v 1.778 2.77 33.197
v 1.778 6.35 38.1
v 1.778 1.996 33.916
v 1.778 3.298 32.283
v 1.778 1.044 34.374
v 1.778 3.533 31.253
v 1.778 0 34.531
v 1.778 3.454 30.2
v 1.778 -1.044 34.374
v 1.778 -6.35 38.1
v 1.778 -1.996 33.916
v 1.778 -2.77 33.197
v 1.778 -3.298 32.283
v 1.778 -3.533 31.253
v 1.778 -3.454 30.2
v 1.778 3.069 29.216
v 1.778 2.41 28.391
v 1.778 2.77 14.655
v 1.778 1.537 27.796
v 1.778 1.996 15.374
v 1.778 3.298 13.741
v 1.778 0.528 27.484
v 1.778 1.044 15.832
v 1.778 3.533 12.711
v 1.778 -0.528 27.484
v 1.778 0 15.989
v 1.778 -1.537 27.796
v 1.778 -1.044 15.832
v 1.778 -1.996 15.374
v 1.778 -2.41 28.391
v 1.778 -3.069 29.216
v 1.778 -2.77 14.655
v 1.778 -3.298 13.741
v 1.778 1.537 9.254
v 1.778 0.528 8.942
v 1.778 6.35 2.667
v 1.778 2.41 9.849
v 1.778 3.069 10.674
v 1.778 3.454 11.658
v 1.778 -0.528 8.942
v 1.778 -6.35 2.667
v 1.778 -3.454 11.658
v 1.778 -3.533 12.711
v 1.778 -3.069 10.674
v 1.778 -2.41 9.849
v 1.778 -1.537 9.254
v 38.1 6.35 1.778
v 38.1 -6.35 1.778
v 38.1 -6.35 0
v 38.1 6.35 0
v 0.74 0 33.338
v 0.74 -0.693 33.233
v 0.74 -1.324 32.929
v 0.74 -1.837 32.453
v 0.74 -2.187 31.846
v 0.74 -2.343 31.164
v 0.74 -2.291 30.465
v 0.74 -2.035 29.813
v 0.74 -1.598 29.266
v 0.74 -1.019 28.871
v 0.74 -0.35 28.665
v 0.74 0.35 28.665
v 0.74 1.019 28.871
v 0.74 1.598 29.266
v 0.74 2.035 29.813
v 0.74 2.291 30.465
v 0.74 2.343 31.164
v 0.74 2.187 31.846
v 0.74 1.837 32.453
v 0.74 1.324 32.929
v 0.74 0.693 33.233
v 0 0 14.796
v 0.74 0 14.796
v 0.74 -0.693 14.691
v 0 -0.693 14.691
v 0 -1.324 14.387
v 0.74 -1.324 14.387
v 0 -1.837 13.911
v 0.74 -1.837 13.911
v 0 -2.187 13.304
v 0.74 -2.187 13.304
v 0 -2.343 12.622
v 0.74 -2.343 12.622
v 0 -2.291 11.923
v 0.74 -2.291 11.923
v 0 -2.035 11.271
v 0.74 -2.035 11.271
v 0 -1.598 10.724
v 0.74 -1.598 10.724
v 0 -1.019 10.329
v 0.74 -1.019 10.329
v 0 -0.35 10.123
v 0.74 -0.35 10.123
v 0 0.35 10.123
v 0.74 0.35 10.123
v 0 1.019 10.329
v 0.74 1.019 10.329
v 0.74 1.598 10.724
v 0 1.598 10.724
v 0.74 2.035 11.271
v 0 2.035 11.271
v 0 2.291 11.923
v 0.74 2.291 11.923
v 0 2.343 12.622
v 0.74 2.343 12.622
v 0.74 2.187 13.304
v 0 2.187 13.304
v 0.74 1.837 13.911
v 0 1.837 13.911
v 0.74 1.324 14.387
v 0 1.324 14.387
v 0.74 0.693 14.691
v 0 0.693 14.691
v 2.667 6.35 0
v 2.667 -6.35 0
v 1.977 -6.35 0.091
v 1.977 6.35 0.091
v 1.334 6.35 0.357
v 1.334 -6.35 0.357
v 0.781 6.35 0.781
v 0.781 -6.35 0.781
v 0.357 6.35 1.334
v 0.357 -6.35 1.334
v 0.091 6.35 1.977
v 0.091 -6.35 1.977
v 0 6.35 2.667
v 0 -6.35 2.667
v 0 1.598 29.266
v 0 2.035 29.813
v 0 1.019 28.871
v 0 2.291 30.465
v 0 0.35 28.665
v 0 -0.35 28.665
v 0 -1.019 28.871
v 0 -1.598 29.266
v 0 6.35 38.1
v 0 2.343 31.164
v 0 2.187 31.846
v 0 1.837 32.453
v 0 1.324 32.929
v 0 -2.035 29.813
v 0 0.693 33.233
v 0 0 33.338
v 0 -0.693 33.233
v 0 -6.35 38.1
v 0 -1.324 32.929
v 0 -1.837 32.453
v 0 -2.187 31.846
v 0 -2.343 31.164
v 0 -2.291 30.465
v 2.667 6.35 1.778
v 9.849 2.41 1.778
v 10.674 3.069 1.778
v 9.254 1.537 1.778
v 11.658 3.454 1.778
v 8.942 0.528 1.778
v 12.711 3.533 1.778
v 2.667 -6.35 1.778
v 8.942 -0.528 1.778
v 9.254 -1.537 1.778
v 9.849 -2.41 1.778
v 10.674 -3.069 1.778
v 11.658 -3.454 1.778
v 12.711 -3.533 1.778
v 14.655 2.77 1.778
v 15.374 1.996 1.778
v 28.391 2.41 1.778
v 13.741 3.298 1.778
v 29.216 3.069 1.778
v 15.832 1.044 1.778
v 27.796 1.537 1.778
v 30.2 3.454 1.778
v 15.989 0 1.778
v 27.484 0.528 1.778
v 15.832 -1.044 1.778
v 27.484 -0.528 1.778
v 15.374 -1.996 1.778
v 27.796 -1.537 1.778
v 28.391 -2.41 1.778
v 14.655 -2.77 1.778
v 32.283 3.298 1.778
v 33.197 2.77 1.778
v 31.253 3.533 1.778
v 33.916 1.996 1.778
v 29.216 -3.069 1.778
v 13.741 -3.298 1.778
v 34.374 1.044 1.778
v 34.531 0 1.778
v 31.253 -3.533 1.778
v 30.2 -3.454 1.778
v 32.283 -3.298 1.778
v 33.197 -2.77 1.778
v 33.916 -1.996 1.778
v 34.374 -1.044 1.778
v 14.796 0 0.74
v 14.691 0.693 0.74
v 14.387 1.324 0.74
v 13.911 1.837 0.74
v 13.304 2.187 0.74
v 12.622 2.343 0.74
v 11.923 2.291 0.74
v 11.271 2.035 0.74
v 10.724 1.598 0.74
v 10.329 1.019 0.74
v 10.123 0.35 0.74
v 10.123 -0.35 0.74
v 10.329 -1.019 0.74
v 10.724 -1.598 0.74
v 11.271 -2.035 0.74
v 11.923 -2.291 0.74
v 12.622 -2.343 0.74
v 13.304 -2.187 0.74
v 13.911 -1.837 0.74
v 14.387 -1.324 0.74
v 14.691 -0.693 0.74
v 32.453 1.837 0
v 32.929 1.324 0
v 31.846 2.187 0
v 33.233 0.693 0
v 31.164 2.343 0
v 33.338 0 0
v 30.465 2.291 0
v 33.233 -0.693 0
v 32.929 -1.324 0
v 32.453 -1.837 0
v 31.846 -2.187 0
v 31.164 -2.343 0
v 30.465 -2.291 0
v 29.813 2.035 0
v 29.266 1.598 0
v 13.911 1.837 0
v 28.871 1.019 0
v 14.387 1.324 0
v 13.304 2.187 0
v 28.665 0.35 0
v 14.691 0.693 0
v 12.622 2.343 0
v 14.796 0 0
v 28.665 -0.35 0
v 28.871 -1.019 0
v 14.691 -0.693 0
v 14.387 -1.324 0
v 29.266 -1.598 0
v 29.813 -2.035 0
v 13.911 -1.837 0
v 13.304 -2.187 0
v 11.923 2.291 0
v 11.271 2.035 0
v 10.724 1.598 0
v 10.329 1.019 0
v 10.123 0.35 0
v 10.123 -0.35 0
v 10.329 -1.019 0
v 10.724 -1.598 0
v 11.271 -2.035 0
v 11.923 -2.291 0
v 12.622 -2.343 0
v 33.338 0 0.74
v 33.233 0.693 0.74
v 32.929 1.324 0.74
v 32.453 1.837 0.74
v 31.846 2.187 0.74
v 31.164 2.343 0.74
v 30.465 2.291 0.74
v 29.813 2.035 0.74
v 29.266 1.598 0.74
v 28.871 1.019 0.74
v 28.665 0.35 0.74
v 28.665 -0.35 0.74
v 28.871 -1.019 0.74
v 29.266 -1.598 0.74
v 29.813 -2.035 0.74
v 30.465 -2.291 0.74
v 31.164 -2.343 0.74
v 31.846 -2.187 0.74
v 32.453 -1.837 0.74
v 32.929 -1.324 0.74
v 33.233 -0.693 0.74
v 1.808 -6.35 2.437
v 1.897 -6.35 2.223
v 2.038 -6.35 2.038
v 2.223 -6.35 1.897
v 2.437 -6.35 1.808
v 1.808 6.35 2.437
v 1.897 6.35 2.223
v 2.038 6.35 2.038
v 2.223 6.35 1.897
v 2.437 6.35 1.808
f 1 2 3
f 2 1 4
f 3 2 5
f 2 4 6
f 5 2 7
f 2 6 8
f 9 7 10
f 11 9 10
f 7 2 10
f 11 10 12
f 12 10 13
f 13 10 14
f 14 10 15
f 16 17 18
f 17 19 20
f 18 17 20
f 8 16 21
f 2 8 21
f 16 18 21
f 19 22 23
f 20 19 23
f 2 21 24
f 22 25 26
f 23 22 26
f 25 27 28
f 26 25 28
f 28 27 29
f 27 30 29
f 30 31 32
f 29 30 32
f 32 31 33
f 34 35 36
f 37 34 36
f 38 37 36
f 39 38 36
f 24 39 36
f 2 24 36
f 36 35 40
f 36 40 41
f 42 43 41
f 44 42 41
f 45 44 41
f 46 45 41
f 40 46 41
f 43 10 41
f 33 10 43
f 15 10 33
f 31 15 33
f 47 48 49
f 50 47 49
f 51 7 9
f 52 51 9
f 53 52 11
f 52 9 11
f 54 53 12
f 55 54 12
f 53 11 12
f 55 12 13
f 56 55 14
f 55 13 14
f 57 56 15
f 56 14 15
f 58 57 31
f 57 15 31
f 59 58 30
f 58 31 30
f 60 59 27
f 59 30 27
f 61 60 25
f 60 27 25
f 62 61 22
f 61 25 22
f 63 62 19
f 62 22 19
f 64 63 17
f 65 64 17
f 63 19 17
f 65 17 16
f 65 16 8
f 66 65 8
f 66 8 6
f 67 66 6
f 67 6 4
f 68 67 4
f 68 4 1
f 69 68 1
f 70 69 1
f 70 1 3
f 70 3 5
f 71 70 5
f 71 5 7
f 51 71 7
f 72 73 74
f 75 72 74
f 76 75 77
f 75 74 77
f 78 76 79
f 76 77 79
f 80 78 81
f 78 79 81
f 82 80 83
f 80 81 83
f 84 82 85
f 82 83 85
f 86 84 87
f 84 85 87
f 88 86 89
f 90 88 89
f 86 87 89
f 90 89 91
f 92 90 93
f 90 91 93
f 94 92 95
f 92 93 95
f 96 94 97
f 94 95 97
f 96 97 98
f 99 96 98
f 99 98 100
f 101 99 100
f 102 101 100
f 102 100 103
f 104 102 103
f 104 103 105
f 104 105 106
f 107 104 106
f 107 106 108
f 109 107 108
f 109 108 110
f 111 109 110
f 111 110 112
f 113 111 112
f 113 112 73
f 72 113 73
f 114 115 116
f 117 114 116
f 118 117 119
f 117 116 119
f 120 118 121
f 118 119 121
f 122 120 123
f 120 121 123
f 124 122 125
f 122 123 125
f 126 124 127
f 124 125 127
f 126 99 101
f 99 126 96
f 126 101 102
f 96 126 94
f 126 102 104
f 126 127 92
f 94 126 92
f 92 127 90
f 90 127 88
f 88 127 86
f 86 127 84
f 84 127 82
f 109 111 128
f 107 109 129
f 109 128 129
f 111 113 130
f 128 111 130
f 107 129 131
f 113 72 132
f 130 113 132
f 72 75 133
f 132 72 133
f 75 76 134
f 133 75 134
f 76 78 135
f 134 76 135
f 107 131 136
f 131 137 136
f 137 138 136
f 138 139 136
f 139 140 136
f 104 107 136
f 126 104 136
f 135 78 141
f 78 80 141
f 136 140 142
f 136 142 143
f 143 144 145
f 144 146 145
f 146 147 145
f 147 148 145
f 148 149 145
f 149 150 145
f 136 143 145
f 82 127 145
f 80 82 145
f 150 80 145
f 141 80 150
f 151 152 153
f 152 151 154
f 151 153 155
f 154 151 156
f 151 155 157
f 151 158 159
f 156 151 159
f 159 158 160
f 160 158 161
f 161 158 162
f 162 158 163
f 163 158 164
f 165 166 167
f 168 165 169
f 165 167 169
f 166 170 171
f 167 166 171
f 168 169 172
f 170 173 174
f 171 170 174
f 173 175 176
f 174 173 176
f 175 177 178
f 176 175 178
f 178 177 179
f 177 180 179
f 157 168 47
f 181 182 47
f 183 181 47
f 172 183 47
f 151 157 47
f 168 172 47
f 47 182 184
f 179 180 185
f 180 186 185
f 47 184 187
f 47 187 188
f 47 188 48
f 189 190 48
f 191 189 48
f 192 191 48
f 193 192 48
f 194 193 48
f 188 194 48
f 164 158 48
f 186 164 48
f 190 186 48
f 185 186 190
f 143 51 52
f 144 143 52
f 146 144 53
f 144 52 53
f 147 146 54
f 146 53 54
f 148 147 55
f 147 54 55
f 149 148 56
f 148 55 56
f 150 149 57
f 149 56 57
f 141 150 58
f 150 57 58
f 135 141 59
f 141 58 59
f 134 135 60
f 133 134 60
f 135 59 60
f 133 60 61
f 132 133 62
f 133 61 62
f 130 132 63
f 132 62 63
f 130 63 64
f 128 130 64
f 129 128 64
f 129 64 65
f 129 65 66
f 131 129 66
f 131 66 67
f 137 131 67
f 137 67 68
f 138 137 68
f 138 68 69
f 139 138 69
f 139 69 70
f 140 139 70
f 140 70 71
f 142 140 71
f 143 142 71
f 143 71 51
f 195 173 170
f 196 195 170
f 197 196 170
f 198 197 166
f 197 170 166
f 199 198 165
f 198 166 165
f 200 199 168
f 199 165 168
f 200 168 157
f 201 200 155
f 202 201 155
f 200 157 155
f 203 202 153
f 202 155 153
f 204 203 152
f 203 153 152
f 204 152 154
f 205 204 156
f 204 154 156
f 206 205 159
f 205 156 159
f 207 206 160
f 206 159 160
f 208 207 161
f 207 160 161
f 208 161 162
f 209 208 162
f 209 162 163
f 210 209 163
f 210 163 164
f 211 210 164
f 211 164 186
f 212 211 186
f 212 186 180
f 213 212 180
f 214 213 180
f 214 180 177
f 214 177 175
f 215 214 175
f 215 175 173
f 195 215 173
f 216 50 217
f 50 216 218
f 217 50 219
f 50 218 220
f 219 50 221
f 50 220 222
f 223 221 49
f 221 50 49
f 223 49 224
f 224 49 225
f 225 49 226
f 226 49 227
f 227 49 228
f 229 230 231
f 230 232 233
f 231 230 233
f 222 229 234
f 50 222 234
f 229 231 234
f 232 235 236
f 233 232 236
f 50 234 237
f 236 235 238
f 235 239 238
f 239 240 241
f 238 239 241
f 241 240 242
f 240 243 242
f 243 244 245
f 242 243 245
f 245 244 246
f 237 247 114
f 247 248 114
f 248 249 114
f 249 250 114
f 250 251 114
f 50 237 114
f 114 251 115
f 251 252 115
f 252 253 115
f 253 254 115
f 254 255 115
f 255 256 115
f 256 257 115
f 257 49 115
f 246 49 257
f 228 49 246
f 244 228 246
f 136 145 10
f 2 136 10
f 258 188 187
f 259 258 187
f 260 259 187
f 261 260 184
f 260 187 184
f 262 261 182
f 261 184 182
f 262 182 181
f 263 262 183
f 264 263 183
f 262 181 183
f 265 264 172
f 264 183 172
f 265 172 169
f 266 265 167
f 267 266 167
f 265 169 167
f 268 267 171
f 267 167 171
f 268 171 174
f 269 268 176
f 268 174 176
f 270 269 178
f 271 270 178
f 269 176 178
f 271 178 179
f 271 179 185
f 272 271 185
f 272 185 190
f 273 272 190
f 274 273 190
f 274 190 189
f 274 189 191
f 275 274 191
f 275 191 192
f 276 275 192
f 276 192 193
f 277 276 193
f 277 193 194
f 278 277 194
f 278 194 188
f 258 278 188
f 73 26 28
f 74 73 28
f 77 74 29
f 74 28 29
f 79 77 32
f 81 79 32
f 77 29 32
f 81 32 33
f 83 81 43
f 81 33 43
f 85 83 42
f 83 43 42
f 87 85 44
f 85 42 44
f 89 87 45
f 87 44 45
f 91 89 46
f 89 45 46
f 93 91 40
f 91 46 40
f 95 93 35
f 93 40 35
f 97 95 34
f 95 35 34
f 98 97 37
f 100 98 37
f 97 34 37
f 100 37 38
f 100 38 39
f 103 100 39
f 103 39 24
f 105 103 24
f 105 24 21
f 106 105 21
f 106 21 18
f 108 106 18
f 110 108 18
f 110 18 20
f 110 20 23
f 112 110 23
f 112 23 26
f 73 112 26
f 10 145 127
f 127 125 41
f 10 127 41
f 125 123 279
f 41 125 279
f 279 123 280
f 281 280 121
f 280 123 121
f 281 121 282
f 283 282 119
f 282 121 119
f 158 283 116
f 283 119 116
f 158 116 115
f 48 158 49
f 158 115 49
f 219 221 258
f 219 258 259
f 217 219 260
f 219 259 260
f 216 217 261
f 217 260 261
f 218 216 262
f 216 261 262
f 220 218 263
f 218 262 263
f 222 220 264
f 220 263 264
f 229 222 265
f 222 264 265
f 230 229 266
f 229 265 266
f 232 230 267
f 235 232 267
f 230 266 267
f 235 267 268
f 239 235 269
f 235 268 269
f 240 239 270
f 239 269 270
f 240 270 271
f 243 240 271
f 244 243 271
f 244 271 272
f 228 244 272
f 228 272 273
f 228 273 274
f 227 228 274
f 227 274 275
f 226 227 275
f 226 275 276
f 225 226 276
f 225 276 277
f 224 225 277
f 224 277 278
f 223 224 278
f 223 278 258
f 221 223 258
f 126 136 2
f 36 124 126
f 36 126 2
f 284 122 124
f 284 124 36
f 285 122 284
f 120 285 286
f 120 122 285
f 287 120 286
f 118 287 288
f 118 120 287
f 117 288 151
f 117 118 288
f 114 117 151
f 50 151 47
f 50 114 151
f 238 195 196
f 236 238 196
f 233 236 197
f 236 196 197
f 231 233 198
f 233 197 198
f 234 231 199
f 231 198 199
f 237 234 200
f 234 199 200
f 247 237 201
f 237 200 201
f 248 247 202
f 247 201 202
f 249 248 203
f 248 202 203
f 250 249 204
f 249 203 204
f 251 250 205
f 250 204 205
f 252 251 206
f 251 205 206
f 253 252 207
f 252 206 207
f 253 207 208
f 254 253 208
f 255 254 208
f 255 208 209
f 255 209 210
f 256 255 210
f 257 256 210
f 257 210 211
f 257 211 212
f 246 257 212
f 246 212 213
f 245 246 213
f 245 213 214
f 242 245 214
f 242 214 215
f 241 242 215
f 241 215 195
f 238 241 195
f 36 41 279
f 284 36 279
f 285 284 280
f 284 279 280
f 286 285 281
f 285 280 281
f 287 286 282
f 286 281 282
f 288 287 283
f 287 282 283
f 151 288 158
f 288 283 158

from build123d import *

# Parameters (mm, degrees)
EXTRUDE_THIN1_START          = -6.35
EXTRUDE_THIN1_DEPTH          = 12.7
SKETCH4_R                    = 2.3495
EXTRUDE3_DEPTH               = 51.526212207
SKETCH7_R                    = 3.5433
CUT_EXTRUDE1_DEPTH           = 54.020940995
CUT_EXTRUDE1_DRAFT           = -49
CUT_EXTRUDE1_PROFILE_2_DEPTH = 54.020940995
CUT_EXTRUDE1_PROFILE_2_DRAFT = -49
CIRPATTERN1_COUNT            = 2
CIRPATTERN1_COPY_1_SKETCH_R  = 3.5433
CIRPATTERN1_COPY_1_DEPTH     = 54.020940995
CIRPATTERN1_COPY_1_DRAFT     = -49
CIRPATTERN1_COPY_2_SKETCH_R  = 3.5433
CIRPATTERN1_COPY_2_DEPTH     = 54.020940995
CIRPATTERN1_COPY_2_DRAFT     = -49
CIRPATTERN1_COPY_3_SKETCH_R  = 3.5433
CIRPATTERN1_COPY_3_DEPTH     = 54.020940995
CIRPATTERN1_COPY_3_DRAFT     = -49


# Read off the part's stored shape, not the designer's step: Extrude-Thin1
with BuildPart() as part:
    # Extrude-Thin1 outline → Extrude-Thin1 (new body)
    with BuildSketch(Plane(origin=(0, 0, 0), x_dir=(1, 0, 0), z_dir=(0, 1, 0)).offset(EXTRUDE_THIN1_START)):
        with BuildLine():
            Line((2.667, -1.778), (38.1, -1.778))
            Line((38.1, -1.778), (38.1, 0))
            Line((38.1, 0), (2.667, 0))
            ThreePointArc((2.667, 0), (0.781146215, -0.781146215), (0, -2.667))
            Line((0, -2.667), (0, -38.1))
            Line((0, -38.1), (1.778, -38.1))
            Line((1.778, -38.1), (1.778, -2.667))
            ThreePointArc((1.778, -2.667), (2.038382072, -2.038382072), (2.667, -1.778))
        make_face()
    extrude(amount=EXTRUDE_THIN1_DEPTH)

    # Sketch4 → Extrude3 (cut, through all)
    with BuildSketch(Plane(origin=(3.556, 0, 1.778), x_dir=(1, 0, 0), z_dir=(0, 0, 1))):
        with Locations((27.432, 0)):
            Circle(SKETCH4_R)
        with Locations((8.89, 0)):
            Circle(SKETCH4_R)
    extrude3 = extrude(amount=-EXTRUDE3_DEPTH, mode=Mode.SUBTRACT)


with BuildPart() as cut_extrude1_tool:
    # Sketch7 → Cut-Extrude1 (with draft: the straight prism first)
    with BuildSketch(Plane.XY.offset(1.778)):
        with Locations((30.988, 0)):
            Circle(SKETCH7_R)
    extrude(amount=-CUT_EXTRUDE1_DEPTH)
    # Cut-Extrude1: the draft: its side faces are tilted about the plane it starts from
    cut_extrude1_sides = [cut_extrude1_tool.faces().sort_by_distance(p)[0] for p in [
        (27.4447, 0, -25.232470498),
    ]]
    draft(cut_extrude1_sides, Plane.XY.offset(1.778), CUT_EXTRUDE1_DRAFT)


with BuildPart() as part_1:
    add(part.part)

    # Cut-Extrude1: cut by cut_extrude1_tool
    add(cut_extrude1_tool.part, mode=Mode.SUBTRACT)


with BuildPart() as cut_extrude1_profile_2_tool:
    # Sketch7 → Cut-Extrude1 profile 2 (with draft: the straight prism first)
    with BuildSketch(Plane.XY.offset(1.778)):
        with Locations((12.446, 0)):
            Circle(SKETCH7_R)
    extrude(amount=-CUT_EXTRUDE1_PROFILE_2_DEPTH)
    # Cut-Extrude1 profile 2: the draft: its side faces are tilted about the plane it starts from
    cut_extrude1_profile_2_sides = [cut_extrude1_profile_2_tool.faces().sort_by_distance(p)[0] for p in [
        (8.9027, 0, -25.232470498),
    ]]
    draft(cut_extrude1_profile_2_sides, Plane.XY.offset(1.778), CUT_EXTRUDE1_PROFILE_2_DRAFT)


with BuildPart() as part_2:
    add(part_1.part)

    # Cut-Extrude1 profile 2: cut by cut_extrude1_profile_2_tool
    add(cut_extrude1_profile_2_tool.part, mode=Mode.SUBTRACT)

    # CirPattern1: Extrude3 ×2 about axis
    cirpattern1_axis = Axis((0, 0, 0), (0.7071067811865464, 0, 0.7071067811865487))
    for i in range(1, CIRPATTERN1_COUNT):
        add(extrude3.rotate(cirpattern1_axis, i * 360 / CIRPATTERN1_COUNT), mode=Mode.SUBTRACT)


with BuildPart() as cirpattern1_copy_1_tool:
    # CirPattern1 copy 1 sketch → CirPattern1 copy 1 (with draft: the straight prism first)
    with BuildSketch(Plane(origin=(1.778, 0, 0), x_dir=(0, 0, 1), z_dir=(1, 0, 0))):
        with Locations((30.988, 0)):
            Circle(CIRPATTERN1_COPY_1_SKETCH_R)
    extrude(amount=-CIRPATTERN1_COPY_1_DEPTH)
    # CirPattern1 copy 1: the draft: its side faces are tilted about the plane it starts from
    cirpattern1_copy_1_sides = [cirpattern1_copy_1_tool.faces().sort_by_distance(p)[0] for p in [
        (-25.232470498, 0, 27.4447),
    ]]
    draft(cirpattern1_copy_1_sides, Plane(origin=(1.778, 0, 0), x_dir=(0, 0, 1), z_dir=(1, 0, 0)), CIRPATTERN1_COPY_1_DRAFT)


with BuildPart() as part_3:
    add(part_2.part)

    # CirPattern1 copy 1: cut by cirpattern1_copy_1_tool
    add(cirpattern1_copy_1_tool.part, mode=Mode.SUBTRACT)


with BuildPart() as cirpattern1_copy_2_tool:
    # CirPattern1 copy 2 sketch → CirPattern1 copy 2 (with draft: the straight prism first)
    with BuildSketch(Plane(origin=(1.778, 0, 0), x_dir=(0, 0, 1), z_dir=(1, 0, 0))):
        with Locations((12.446, 0)):
            Circle(CIRPATTERN1_COPY_2_SKETCH_R)
    extrude(amount=-CIRPATTERN1_COPY_2_DEPTH)
    # CirPattern1 copy 2: the draft: its side faces are tilted about the plane it starts from
    cirpattern1_copy_2_sides = [cirpattern1_copy_2_tool.faces().sort_by_distance(p)[0] for p in [
        (-25.232470498, 0, 8.9027),
    ]]
    draft(cirpattern1_copy_2_sides, Plane(origin=(1.778, 0, 0), x_dir=(0, 0, 1), z_dir=(1, 0, 0)), CIRPATTERN1_COPY_2_DRAFT)


with BuildPart() as part_4:
    add(part_3.part)

    # CirPattern1 copy 2: cut by cirpattern1_copy_2_tool
    add(cirpattern1_copy_2_tool.part, mode=Mode.SUBTRACT)


with BuildPart() as cirpattern1_copy_3_tool:
    # CirPattern1 copy 3 sketch → CirPattern1 copy 3 (with draft: the straight prism first)
    with BuildSketch(Plane(origin=(1.778, 0, 0), x_dir=(0, 0, 1), z_dir=(1, 0, 0))):
        with Locations((12.446, 0)):
            Circle(CIRPATTERN1_COPY_3_SKETCH_R)
    extrude(amount=-CIRPATTERN1_COPY_3_DEPTH)
    # CirPattern1 copy 3: the draft: its side faces are tilted about the plane it starts from
    cirpattern1_copy_3_sides = [cirpattern1_copy_3_tool.faces().sort_by_distance(p)[0] for p in [
        (-25.232470498, 0, 8.9027),
    ]]
    draft(cirpattern1_copy_3_sides, Plane(origin=(1.778, 0, 0), x_dir=(0, 0, 1), z_dir=(1, 0, 0)), CIRPATTERN1_COPY_3_DRAFT)


with BuildPart() as part_5:
    add(part_4.part)

    # CirPattern1 copy 3: cut by cirpattern1_copy_3_tool
    add(cirpattern1_copy_3_tool.part, mode=Mode.SUBTRACT)


solid = part_5.part
